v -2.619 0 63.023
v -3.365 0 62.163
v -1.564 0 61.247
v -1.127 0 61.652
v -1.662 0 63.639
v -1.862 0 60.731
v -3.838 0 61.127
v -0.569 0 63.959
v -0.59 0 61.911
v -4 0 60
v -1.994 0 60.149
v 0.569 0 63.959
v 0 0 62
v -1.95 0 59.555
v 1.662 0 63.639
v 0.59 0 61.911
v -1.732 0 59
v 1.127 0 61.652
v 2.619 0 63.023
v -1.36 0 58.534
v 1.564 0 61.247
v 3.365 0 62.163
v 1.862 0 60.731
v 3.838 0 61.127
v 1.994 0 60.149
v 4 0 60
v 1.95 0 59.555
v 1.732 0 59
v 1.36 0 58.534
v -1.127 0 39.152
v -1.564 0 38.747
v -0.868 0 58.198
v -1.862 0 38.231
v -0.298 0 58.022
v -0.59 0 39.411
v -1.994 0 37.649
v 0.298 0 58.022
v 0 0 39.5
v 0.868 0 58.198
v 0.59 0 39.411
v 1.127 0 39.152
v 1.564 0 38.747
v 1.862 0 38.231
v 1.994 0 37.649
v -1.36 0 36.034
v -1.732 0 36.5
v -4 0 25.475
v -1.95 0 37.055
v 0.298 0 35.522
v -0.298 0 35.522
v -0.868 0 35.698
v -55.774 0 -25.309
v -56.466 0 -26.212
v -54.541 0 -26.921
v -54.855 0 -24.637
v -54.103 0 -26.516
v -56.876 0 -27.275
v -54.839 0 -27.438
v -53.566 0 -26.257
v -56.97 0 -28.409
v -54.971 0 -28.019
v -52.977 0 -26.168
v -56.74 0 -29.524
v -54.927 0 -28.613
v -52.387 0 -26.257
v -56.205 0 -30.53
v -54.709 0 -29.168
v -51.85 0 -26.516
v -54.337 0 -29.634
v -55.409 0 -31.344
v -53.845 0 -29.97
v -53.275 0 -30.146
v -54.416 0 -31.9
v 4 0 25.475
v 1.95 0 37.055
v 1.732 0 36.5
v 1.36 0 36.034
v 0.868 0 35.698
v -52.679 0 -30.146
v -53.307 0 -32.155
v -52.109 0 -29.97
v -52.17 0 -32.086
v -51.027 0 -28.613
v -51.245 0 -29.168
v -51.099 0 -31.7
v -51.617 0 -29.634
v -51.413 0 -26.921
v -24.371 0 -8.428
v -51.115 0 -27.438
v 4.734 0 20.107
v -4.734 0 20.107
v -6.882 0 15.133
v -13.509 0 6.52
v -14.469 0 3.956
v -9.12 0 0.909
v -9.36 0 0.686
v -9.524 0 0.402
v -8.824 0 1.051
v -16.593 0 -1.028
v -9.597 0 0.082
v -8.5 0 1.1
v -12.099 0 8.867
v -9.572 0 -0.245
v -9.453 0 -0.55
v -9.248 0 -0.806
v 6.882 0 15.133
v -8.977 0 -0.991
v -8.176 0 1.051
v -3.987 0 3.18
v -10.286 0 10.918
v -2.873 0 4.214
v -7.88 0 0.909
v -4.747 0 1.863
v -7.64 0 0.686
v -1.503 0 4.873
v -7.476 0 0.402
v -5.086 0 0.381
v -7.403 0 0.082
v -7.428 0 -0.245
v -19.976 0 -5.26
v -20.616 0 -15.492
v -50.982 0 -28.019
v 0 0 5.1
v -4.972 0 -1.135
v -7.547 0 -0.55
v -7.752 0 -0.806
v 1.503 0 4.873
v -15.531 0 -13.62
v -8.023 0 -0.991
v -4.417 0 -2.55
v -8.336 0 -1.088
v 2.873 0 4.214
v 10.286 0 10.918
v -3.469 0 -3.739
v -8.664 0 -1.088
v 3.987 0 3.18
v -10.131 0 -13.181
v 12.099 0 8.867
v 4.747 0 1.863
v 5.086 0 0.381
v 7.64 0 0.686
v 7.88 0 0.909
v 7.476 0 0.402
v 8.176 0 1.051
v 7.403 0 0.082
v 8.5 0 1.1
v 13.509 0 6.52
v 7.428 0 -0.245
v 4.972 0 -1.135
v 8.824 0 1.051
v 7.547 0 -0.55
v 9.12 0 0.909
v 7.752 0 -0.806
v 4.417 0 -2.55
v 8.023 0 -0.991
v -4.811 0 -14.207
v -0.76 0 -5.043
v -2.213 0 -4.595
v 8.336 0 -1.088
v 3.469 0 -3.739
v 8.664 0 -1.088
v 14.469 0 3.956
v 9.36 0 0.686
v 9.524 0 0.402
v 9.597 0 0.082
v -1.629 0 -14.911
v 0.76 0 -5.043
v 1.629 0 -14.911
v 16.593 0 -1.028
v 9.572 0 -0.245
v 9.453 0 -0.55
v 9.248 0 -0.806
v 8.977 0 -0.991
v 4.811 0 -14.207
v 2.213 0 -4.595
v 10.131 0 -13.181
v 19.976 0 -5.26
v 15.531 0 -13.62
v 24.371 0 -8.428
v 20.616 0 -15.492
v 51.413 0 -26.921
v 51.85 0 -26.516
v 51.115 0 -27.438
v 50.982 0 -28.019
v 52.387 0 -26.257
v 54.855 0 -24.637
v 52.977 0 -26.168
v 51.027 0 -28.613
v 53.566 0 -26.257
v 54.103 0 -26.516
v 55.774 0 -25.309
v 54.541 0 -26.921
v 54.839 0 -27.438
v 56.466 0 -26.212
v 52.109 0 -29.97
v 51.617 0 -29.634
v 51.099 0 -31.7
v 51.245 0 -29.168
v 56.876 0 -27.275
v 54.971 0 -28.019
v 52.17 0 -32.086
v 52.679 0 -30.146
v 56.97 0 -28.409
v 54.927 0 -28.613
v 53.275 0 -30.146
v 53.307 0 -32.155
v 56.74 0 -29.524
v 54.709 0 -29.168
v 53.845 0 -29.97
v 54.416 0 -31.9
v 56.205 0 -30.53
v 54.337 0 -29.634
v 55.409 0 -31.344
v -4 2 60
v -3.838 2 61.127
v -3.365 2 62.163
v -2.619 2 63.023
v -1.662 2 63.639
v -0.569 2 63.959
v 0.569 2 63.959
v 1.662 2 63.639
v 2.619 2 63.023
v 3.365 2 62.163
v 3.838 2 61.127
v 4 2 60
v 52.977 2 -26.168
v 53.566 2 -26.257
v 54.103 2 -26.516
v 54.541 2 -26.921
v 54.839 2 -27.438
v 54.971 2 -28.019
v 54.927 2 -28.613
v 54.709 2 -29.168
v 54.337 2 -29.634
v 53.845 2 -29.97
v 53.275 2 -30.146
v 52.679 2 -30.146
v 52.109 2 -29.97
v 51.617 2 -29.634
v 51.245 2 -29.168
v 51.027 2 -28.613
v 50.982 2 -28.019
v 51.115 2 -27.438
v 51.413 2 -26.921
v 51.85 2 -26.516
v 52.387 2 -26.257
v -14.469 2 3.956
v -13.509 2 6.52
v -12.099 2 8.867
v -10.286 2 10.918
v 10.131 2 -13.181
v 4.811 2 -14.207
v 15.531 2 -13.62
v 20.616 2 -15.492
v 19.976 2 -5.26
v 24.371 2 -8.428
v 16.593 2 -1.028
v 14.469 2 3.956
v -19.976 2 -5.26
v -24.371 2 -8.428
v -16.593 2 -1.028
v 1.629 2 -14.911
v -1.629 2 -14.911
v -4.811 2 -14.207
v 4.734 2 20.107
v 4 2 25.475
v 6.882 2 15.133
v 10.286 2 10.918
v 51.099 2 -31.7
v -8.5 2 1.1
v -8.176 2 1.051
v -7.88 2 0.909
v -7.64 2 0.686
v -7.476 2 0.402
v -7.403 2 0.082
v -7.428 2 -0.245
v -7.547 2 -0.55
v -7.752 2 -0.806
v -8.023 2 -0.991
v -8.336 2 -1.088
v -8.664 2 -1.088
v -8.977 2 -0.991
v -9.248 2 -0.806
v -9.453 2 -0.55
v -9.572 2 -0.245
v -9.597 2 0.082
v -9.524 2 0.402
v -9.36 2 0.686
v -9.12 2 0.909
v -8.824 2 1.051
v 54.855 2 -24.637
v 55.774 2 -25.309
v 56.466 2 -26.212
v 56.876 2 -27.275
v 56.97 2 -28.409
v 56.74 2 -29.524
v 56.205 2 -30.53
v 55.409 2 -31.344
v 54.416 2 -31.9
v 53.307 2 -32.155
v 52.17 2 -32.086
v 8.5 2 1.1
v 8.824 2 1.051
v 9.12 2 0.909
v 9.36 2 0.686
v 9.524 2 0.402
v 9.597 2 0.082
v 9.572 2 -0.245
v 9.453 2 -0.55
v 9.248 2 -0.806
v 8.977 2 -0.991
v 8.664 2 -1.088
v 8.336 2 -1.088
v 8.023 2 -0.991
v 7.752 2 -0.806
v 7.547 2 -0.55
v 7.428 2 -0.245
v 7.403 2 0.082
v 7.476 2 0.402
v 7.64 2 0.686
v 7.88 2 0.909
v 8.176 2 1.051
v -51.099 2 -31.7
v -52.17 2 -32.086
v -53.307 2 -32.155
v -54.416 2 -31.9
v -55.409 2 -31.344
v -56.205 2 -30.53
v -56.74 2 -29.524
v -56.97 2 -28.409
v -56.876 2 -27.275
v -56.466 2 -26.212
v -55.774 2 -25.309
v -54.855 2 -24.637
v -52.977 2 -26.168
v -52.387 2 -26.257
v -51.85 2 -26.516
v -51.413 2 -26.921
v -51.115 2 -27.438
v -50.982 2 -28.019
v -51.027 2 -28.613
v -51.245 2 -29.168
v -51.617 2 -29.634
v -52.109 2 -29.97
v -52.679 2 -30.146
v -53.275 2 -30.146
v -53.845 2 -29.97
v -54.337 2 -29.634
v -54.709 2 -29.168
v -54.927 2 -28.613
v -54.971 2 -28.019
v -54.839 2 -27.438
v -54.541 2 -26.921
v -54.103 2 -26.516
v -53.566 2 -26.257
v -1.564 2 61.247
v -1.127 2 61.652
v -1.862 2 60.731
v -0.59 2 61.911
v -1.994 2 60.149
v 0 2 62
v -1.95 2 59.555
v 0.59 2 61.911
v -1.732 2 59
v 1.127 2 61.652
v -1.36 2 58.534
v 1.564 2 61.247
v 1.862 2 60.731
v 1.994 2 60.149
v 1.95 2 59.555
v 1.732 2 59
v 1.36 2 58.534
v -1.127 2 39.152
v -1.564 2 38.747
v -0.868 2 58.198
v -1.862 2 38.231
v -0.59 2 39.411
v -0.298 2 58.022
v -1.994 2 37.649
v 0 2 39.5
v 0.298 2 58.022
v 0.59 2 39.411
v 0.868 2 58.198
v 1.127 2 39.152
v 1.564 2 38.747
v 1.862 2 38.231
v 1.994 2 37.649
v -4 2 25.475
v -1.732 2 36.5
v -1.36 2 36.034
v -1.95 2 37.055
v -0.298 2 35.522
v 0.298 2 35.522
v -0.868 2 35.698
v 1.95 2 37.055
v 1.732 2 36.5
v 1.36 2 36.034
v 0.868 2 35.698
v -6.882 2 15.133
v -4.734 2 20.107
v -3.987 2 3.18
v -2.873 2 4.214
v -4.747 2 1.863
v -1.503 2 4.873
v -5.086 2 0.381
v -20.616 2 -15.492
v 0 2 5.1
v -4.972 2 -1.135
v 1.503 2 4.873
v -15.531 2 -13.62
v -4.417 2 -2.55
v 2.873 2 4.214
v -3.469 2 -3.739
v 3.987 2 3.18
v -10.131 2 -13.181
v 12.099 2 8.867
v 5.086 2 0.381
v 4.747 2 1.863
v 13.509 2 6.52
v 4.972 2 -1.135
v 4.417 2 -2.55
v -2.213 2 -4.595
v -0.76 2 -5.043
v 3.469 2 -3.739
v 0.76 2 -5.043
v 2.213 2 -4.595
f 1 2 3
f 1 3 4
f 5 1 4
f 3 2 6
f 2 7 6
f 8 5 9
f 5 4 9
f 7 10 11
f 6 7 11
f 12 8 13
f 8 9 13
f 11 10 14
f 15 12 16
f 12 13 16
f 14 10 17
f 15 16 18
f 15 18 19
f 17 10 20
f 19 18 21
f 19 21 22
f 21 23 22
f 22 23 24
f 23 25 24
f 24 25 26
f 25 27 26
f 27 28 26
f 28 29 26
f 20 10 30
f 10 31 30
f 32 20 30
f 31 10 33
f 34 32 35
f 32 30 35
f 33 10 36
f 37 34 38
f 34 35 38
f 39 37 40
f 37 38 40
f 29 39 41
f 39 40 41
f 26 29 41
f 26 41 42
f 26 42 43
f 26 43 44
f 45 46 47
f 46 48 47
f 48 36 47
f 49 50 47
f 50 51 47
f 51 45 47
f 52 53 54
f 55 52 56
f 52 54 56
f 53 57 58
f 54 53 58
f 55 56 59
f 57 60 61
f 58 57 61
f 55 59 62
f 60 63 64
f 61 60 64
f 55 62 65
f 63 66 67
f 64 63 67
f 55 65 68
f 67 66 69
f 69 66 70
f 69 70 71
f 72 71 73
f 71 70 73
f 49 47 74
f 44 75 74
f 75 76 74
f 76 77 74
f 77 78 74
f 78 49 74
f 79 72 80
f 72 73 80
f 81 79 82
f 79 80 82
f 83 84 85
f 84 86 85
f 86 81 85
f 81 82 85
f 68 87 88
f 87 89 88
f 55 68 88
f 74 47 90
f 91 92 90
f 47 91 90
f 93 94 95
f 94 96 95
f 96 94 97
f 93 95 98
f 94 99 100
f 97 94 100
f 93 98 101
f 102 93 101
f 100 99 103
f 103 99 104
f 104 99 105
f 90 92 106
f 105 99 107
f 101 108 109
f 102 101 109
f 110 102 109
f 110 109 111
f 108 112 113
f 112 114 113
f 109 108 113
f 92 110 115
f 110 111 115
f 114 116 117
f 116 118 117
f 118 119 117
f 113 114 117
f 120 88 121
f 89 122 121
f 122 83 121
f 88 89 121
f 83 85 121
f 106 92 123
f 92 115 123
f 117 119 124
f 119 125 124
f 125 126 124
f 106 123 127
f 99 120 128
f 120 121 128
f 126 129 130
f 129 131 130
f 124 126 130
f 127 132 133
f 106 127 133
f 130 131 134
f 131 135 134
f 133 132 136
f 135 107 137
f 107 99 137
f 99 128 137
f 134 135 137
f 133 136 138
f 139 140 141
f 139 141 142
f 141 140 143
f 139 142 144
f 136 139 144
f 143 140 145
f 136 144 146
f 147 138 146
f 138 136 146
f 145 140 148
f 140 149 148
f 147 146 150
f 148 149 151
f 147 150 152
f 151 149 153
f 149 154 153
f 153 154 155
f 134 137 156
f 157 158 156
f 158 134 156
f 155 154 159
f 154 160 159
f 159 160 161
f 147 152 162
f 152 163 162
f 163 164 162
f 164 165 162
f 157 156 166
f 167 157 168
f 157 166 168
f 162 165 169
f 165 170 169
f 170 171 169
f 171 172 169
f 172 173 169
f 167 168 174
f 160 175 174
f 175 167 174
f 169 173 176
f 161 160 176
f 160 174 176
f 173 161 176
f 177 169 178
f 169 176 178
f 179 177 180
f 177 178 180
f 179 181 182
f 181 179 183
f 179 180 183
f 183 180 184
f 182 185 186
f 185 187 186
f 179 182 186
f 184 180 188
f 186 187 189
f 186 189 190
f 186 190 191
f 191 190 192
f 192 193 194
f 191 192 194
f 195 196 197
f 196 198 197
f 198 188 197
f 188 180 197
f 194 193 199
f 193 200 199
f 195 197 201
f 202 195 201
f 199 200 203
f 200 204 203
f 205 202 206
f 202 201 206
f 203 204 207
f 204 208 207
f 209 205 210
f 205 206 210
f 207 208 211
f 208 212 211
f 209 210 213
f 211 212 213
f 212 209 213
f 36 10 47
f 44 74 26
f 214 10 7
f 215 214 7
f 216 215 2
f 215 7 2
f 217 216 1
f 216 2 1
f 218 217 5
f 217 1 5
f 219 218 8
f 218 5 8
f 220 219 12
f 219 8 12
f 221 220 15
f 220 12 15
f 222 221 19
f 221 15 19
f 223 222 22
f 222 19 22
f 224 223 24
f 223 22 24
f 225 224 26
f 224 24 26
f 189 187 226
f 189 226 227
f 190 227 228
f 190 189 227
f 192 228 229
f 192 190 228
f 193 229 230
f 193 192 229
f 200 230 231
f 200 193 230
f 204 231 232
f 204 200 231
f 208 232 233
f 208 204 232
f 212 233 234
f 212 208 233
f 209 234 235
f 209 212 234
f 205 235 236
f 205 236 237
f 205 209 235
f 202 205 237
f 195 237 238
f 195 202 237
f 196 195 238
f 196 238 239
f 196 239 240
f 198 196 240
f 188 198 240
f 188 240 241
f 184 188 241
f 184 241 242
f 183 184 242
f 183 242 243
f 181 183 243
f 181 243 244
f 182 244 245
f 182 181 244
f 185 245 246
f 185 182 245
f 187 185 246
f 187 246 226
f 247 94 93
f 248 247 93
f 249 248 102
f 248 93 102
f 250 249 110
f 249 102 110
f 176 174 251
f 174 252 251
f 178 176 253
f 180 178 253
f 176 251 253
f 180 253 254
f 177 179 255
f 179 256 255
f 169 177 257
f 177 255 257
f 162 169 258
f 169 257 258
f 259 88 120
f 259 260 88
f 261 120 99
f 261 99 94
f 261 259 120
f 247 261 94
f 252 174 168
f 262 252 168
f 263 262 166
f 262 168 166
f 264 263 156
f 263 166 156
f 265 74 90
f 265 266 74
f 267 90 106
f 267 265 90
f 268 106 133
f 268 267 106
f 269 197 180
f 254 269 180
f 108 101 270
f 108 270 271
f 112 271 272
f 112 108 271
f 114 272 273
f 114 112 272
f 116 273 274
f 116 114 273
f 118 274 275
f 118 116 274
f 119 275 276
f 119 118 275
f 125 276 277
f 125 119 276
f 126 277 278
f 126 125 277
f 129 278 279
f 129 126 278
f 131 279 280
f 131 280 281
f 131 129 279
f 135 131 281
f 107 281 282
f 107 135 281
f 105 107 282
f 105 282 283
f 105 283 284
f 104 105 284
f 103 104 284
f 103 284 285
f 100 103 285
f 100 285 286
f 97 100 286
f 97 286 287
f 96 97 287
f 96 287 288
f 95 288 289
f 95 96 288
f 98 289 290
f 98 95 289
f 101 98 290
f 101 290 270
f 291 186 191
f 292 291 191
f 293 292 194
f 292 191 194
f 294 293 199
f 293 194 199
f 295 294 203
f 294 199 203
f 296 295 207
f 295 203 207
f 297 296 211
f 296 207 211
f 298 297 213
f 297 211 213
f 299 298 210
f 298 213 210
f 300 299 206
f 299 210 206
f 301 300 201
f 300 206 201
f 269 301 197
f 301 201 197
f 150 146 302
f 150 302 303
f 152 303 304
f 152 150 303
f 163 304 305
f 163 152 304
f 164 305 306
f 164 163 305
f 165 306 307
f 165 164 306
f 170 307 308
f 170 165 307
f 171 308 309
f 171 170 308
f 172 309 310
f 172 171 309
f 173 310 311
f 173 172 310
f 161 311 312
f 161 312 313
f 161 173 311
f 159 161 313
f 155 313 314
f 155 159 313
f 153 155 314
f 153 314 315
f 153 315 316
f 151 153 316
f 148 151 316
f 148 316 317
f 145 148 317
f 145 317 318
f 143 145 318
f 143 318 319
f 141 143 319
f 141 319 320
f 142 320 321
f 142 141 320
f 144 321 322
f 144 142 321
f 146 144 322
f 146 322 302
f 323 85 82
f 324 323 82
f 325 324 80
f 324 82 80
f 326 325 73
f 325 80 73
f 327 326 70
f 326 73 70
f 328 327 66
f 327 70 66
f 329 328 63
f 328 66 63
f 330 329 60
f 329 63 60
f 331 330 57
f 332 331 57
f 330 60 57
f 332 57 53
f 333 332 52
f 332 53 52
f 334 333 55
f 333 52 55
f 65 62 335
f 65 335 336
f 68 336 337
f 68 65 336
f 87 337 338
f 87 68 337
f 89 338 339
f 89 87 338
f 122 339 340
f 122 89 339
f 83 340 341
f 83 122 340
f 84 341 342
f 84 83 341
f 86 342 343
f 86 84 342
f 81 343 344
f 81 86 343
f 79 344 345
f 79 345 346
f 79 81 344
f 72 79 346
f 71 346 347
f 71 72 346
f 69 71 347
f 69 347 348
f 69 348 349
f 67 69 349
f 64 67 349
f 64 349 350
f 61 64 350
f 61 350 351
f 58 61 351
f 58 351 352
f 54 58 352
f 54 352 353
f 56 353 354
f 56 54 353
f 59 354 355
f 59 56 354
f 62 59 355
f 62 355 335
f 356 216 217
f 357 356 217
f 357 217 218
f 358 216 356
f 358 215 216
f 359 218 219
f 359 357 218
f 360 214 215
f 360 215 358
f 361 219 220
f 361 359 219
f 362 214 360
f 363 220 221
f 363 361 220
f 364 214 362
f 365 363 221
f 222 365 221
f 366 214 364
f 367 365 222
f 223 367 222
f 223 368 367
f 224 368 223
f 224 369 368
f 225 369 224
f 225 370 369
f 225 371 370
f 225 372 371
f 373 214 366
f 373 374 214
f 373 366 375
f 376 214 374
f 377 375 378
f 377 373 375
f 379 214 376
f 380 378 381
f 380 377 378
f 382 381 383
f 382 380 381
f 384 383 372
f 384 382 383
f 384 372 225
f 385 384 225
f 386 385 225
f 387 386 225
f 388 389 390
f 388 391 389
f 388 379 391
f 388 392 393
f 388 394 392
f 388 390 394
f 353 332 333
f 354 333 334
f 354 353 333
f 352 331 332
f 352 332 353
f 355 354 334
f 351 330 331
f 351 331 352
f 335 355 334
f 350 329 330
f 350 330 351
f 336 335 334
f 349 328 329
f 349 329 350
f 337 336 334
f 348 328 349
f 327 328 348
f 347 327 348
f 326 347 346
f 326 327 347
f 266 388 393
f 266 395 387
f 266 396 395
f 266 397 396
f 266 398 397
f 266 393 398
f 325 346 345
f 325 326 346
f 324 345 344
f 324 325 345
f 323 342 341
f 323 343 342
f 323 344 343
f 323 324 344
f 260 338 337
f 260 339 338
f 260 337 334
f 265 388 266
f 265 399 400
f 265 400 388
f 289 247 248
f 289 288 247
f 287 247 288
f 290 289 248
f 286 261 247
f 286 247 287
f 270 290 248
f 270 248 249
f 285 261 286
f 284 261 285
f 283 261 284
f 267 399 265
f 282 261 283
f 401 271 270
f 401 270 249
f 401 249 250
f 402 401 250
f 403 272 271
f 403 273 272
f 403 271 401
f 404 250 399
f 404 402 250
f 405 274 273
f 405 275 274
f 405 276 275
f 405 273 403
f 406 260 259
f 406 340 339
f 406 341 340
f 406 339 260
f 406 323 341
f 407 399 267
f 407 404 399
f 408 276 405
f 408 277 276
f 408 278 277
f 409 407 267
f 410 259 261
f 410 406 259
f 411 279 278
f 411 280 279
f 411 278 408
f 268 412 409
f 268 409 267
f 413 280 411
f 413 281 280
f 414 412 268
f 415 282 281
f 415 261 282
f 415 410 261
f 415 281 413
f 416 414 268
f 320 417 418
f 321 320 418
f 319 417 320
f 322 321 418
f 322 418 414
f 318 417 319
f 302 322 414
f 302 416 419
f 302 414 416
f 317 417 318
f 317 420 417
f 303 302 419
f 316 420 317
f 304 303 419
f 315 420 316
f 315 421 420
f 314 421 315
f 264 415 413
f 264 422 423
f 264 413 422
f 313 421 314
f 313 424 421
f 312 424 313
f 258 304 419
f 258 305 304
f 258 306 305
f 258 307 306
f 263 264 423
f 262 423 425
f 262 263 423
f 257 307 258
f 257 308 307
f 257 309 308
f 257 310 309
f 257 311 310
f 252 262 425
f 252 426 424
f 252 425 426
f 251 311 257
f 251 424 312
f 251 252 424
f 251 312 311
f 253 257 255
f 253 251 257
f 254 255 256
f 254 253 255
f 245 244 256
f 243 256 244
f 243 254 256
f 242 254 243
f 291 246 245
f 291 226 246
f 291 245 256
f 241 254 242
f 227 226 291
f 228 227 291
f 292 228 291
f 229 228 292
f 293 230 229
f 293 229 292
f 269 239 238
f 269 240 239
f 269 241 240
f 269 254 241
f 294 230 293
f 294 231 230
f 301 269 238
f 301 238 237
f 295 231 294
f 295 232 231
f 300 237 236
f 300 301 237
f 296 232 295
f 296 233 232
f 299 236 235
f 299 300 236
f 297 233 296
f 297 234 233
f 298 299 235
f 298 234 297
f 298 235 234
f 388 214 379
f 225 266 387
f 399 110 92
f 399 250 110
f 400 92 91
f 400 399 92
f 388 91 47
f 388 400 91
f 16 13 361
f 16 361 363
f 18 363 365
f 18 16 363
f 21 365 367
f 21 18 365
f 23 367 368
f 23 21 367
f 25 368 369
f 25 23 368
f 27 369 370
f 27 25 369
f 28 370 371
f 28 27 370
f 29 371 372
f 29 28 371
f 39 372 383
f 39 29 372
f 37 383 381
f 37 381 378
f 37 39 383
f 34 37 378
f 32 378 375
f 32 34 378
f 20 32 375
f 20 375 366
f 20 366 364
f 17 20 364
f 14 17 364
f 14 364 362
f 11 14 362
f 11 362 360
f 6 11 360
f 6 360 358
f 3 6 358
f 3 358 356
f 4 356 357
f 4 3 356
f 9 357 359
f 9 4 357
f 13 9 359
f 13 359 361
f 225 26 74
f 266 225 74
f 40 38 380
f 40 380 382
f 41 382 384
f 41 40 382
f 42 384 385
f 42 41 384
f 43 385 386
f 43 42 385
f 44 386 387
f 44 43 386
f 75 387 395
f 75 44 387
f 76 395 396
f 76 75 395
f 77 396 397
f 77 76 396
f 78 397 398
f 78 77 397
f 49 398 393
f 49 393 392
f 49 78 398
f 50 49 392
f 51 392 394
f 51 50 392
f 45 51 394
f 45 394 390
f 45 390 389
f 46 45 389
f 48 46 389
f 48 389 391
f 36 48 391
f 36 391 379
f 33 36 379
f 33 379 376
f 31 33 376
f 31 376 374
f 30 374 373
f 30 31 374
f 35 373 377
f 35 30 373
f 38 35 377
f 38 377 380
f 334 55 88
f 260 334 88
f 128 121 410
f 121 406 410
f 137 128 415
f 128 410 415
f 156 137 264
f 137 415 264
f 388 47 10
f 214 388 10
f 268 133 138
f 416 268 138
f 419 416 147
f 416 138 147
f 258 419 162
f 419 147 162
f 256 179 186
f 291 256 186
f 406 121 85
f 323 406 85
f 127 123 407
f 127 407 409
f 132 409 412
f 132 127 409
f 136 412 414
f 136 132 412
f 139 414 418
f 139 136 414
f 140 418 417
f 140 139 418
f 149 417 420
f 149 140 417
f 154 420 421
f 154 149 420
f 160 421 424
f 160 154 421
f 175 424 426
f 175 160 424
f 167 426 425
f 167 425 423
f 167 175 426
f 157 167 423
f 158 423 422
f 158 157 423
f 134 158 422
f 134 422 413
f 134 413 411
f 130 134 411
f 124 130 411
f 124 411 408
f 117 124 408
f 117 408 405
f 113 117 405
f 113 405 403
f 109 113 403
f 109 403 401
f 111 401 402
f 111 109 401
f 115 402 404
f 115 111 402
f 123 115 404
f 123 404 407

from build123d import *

# Parameters (mm, degrees)
SKETCH_1_R      = 2
SKETCH_1_R_2    = 1.1
SKETCH_1_R_3    = 5.1
EXTRUDE_1_DEPTH = 2
FILLET_1_R      = 20


with BuildPart() as part:
    # ｽｹｯﾁ1 → ﾎﾞｽ - 押し出し1 (new body)
    with BuildSketch(Plane(origin=(0, 0, 0), x_dir=(1, 0, 0), z_dir=(0, 1, 0))):
        with BuildLine():
            ThreePointArc((-51.098969856, 31.700084423), (-56.508646061, 30.046179796), (-54.854741914, 24.636503444))
            Line((-54.854741914, 24.636503444), (-14.642511526, 3.255281279))
            ThreePointArc((-14.642511526, 3.255281279), (-12.857509511, -7.725571124), (-4, -14.456832295))
            Line((-4, -14.456832295), (-4, -60))
            ThreePointArc((-4, -60), (0, -64), (4, -60))
            Line((4, -60), (4, -14.456832295))
            ThreePointArc((4, -14.456832295), (12.857509511, -7.725571124), (14.642511526, 3.255281279))
            Line((14.642511526, 3.255281279), (54.854741789, 24.636503378))
            ThreePointArc((54.854741789, 24.636503378), (56.508645811, 30.046180267), (51.098968789, 31.700083856))
            Line((51.098968789, 31.700083856), (10.886739024, 10.318862022))
            ThreePointArc((10.886739024, 10.318862022), (0, 15), (-10.886739024, 10.318862022))
            Line((-10.886739024, 10.318862022), (-51.098969856, 31.700084423))
        make_face()
        with Locations(Location((0, -60, 0), (0, 0, 270))):
            Circle(SKETCH_1_R, mode=Mode.SUBTRACT)
        with Locations(Location((0, -37.5, 0), (0, 0, 270))):
            Circle(SKETCH_1_R, mode=Mode.SUBTRACT)
        with Locations(Location((-52.976855572, 28.168293767, 0), (0, 0, 270))):
            Circle(SKETCH_1_R, mode=Mode.SUBTRACT)
        with Locations(Location((-8.5, 0, 0), (0, 0, 270))):
            Circle(SKETCH_1_R_2, mode=Mode.SUBTRACT)
        with Locations(Location((0, 0, 0), (0, 0, 270))):
            Circle(SKETCH_1_R_3, mode=Mode.SUBTRACT)
        with Locations(Location((8.5, 0, 0), (0, 0, 270))):
            Circle(SKETCH_1_R_2, mode=Mode.SUBTRACT)
        with Locations(Location((52.976855572, 28.168293767, 0), (0, 0, 270))):
            Circle(SKETCH_1_R, mode=Mode.SUBTRACT)
    extrude(amount=EXTRUDE_1_DEPTH)

    # ﾌｨﾚｯﾄ1
    fillet_1_edges = [part.edges().sort_by_distance(p)[0] for p in [
        (-4, 1, 14.456832295),
        (-14.642511526, 1, -3.255281279),
        (-10.886739024, 1, -10.318862022),
        (10.886739024, 1, -10.318862022),
        (14.642511526, 1, -3.255281279),
        (4, 1, 14.456832295),
    ]]
    fillet(fillet_1_edges, radius=FILLET_1_R)


solid = part.part
